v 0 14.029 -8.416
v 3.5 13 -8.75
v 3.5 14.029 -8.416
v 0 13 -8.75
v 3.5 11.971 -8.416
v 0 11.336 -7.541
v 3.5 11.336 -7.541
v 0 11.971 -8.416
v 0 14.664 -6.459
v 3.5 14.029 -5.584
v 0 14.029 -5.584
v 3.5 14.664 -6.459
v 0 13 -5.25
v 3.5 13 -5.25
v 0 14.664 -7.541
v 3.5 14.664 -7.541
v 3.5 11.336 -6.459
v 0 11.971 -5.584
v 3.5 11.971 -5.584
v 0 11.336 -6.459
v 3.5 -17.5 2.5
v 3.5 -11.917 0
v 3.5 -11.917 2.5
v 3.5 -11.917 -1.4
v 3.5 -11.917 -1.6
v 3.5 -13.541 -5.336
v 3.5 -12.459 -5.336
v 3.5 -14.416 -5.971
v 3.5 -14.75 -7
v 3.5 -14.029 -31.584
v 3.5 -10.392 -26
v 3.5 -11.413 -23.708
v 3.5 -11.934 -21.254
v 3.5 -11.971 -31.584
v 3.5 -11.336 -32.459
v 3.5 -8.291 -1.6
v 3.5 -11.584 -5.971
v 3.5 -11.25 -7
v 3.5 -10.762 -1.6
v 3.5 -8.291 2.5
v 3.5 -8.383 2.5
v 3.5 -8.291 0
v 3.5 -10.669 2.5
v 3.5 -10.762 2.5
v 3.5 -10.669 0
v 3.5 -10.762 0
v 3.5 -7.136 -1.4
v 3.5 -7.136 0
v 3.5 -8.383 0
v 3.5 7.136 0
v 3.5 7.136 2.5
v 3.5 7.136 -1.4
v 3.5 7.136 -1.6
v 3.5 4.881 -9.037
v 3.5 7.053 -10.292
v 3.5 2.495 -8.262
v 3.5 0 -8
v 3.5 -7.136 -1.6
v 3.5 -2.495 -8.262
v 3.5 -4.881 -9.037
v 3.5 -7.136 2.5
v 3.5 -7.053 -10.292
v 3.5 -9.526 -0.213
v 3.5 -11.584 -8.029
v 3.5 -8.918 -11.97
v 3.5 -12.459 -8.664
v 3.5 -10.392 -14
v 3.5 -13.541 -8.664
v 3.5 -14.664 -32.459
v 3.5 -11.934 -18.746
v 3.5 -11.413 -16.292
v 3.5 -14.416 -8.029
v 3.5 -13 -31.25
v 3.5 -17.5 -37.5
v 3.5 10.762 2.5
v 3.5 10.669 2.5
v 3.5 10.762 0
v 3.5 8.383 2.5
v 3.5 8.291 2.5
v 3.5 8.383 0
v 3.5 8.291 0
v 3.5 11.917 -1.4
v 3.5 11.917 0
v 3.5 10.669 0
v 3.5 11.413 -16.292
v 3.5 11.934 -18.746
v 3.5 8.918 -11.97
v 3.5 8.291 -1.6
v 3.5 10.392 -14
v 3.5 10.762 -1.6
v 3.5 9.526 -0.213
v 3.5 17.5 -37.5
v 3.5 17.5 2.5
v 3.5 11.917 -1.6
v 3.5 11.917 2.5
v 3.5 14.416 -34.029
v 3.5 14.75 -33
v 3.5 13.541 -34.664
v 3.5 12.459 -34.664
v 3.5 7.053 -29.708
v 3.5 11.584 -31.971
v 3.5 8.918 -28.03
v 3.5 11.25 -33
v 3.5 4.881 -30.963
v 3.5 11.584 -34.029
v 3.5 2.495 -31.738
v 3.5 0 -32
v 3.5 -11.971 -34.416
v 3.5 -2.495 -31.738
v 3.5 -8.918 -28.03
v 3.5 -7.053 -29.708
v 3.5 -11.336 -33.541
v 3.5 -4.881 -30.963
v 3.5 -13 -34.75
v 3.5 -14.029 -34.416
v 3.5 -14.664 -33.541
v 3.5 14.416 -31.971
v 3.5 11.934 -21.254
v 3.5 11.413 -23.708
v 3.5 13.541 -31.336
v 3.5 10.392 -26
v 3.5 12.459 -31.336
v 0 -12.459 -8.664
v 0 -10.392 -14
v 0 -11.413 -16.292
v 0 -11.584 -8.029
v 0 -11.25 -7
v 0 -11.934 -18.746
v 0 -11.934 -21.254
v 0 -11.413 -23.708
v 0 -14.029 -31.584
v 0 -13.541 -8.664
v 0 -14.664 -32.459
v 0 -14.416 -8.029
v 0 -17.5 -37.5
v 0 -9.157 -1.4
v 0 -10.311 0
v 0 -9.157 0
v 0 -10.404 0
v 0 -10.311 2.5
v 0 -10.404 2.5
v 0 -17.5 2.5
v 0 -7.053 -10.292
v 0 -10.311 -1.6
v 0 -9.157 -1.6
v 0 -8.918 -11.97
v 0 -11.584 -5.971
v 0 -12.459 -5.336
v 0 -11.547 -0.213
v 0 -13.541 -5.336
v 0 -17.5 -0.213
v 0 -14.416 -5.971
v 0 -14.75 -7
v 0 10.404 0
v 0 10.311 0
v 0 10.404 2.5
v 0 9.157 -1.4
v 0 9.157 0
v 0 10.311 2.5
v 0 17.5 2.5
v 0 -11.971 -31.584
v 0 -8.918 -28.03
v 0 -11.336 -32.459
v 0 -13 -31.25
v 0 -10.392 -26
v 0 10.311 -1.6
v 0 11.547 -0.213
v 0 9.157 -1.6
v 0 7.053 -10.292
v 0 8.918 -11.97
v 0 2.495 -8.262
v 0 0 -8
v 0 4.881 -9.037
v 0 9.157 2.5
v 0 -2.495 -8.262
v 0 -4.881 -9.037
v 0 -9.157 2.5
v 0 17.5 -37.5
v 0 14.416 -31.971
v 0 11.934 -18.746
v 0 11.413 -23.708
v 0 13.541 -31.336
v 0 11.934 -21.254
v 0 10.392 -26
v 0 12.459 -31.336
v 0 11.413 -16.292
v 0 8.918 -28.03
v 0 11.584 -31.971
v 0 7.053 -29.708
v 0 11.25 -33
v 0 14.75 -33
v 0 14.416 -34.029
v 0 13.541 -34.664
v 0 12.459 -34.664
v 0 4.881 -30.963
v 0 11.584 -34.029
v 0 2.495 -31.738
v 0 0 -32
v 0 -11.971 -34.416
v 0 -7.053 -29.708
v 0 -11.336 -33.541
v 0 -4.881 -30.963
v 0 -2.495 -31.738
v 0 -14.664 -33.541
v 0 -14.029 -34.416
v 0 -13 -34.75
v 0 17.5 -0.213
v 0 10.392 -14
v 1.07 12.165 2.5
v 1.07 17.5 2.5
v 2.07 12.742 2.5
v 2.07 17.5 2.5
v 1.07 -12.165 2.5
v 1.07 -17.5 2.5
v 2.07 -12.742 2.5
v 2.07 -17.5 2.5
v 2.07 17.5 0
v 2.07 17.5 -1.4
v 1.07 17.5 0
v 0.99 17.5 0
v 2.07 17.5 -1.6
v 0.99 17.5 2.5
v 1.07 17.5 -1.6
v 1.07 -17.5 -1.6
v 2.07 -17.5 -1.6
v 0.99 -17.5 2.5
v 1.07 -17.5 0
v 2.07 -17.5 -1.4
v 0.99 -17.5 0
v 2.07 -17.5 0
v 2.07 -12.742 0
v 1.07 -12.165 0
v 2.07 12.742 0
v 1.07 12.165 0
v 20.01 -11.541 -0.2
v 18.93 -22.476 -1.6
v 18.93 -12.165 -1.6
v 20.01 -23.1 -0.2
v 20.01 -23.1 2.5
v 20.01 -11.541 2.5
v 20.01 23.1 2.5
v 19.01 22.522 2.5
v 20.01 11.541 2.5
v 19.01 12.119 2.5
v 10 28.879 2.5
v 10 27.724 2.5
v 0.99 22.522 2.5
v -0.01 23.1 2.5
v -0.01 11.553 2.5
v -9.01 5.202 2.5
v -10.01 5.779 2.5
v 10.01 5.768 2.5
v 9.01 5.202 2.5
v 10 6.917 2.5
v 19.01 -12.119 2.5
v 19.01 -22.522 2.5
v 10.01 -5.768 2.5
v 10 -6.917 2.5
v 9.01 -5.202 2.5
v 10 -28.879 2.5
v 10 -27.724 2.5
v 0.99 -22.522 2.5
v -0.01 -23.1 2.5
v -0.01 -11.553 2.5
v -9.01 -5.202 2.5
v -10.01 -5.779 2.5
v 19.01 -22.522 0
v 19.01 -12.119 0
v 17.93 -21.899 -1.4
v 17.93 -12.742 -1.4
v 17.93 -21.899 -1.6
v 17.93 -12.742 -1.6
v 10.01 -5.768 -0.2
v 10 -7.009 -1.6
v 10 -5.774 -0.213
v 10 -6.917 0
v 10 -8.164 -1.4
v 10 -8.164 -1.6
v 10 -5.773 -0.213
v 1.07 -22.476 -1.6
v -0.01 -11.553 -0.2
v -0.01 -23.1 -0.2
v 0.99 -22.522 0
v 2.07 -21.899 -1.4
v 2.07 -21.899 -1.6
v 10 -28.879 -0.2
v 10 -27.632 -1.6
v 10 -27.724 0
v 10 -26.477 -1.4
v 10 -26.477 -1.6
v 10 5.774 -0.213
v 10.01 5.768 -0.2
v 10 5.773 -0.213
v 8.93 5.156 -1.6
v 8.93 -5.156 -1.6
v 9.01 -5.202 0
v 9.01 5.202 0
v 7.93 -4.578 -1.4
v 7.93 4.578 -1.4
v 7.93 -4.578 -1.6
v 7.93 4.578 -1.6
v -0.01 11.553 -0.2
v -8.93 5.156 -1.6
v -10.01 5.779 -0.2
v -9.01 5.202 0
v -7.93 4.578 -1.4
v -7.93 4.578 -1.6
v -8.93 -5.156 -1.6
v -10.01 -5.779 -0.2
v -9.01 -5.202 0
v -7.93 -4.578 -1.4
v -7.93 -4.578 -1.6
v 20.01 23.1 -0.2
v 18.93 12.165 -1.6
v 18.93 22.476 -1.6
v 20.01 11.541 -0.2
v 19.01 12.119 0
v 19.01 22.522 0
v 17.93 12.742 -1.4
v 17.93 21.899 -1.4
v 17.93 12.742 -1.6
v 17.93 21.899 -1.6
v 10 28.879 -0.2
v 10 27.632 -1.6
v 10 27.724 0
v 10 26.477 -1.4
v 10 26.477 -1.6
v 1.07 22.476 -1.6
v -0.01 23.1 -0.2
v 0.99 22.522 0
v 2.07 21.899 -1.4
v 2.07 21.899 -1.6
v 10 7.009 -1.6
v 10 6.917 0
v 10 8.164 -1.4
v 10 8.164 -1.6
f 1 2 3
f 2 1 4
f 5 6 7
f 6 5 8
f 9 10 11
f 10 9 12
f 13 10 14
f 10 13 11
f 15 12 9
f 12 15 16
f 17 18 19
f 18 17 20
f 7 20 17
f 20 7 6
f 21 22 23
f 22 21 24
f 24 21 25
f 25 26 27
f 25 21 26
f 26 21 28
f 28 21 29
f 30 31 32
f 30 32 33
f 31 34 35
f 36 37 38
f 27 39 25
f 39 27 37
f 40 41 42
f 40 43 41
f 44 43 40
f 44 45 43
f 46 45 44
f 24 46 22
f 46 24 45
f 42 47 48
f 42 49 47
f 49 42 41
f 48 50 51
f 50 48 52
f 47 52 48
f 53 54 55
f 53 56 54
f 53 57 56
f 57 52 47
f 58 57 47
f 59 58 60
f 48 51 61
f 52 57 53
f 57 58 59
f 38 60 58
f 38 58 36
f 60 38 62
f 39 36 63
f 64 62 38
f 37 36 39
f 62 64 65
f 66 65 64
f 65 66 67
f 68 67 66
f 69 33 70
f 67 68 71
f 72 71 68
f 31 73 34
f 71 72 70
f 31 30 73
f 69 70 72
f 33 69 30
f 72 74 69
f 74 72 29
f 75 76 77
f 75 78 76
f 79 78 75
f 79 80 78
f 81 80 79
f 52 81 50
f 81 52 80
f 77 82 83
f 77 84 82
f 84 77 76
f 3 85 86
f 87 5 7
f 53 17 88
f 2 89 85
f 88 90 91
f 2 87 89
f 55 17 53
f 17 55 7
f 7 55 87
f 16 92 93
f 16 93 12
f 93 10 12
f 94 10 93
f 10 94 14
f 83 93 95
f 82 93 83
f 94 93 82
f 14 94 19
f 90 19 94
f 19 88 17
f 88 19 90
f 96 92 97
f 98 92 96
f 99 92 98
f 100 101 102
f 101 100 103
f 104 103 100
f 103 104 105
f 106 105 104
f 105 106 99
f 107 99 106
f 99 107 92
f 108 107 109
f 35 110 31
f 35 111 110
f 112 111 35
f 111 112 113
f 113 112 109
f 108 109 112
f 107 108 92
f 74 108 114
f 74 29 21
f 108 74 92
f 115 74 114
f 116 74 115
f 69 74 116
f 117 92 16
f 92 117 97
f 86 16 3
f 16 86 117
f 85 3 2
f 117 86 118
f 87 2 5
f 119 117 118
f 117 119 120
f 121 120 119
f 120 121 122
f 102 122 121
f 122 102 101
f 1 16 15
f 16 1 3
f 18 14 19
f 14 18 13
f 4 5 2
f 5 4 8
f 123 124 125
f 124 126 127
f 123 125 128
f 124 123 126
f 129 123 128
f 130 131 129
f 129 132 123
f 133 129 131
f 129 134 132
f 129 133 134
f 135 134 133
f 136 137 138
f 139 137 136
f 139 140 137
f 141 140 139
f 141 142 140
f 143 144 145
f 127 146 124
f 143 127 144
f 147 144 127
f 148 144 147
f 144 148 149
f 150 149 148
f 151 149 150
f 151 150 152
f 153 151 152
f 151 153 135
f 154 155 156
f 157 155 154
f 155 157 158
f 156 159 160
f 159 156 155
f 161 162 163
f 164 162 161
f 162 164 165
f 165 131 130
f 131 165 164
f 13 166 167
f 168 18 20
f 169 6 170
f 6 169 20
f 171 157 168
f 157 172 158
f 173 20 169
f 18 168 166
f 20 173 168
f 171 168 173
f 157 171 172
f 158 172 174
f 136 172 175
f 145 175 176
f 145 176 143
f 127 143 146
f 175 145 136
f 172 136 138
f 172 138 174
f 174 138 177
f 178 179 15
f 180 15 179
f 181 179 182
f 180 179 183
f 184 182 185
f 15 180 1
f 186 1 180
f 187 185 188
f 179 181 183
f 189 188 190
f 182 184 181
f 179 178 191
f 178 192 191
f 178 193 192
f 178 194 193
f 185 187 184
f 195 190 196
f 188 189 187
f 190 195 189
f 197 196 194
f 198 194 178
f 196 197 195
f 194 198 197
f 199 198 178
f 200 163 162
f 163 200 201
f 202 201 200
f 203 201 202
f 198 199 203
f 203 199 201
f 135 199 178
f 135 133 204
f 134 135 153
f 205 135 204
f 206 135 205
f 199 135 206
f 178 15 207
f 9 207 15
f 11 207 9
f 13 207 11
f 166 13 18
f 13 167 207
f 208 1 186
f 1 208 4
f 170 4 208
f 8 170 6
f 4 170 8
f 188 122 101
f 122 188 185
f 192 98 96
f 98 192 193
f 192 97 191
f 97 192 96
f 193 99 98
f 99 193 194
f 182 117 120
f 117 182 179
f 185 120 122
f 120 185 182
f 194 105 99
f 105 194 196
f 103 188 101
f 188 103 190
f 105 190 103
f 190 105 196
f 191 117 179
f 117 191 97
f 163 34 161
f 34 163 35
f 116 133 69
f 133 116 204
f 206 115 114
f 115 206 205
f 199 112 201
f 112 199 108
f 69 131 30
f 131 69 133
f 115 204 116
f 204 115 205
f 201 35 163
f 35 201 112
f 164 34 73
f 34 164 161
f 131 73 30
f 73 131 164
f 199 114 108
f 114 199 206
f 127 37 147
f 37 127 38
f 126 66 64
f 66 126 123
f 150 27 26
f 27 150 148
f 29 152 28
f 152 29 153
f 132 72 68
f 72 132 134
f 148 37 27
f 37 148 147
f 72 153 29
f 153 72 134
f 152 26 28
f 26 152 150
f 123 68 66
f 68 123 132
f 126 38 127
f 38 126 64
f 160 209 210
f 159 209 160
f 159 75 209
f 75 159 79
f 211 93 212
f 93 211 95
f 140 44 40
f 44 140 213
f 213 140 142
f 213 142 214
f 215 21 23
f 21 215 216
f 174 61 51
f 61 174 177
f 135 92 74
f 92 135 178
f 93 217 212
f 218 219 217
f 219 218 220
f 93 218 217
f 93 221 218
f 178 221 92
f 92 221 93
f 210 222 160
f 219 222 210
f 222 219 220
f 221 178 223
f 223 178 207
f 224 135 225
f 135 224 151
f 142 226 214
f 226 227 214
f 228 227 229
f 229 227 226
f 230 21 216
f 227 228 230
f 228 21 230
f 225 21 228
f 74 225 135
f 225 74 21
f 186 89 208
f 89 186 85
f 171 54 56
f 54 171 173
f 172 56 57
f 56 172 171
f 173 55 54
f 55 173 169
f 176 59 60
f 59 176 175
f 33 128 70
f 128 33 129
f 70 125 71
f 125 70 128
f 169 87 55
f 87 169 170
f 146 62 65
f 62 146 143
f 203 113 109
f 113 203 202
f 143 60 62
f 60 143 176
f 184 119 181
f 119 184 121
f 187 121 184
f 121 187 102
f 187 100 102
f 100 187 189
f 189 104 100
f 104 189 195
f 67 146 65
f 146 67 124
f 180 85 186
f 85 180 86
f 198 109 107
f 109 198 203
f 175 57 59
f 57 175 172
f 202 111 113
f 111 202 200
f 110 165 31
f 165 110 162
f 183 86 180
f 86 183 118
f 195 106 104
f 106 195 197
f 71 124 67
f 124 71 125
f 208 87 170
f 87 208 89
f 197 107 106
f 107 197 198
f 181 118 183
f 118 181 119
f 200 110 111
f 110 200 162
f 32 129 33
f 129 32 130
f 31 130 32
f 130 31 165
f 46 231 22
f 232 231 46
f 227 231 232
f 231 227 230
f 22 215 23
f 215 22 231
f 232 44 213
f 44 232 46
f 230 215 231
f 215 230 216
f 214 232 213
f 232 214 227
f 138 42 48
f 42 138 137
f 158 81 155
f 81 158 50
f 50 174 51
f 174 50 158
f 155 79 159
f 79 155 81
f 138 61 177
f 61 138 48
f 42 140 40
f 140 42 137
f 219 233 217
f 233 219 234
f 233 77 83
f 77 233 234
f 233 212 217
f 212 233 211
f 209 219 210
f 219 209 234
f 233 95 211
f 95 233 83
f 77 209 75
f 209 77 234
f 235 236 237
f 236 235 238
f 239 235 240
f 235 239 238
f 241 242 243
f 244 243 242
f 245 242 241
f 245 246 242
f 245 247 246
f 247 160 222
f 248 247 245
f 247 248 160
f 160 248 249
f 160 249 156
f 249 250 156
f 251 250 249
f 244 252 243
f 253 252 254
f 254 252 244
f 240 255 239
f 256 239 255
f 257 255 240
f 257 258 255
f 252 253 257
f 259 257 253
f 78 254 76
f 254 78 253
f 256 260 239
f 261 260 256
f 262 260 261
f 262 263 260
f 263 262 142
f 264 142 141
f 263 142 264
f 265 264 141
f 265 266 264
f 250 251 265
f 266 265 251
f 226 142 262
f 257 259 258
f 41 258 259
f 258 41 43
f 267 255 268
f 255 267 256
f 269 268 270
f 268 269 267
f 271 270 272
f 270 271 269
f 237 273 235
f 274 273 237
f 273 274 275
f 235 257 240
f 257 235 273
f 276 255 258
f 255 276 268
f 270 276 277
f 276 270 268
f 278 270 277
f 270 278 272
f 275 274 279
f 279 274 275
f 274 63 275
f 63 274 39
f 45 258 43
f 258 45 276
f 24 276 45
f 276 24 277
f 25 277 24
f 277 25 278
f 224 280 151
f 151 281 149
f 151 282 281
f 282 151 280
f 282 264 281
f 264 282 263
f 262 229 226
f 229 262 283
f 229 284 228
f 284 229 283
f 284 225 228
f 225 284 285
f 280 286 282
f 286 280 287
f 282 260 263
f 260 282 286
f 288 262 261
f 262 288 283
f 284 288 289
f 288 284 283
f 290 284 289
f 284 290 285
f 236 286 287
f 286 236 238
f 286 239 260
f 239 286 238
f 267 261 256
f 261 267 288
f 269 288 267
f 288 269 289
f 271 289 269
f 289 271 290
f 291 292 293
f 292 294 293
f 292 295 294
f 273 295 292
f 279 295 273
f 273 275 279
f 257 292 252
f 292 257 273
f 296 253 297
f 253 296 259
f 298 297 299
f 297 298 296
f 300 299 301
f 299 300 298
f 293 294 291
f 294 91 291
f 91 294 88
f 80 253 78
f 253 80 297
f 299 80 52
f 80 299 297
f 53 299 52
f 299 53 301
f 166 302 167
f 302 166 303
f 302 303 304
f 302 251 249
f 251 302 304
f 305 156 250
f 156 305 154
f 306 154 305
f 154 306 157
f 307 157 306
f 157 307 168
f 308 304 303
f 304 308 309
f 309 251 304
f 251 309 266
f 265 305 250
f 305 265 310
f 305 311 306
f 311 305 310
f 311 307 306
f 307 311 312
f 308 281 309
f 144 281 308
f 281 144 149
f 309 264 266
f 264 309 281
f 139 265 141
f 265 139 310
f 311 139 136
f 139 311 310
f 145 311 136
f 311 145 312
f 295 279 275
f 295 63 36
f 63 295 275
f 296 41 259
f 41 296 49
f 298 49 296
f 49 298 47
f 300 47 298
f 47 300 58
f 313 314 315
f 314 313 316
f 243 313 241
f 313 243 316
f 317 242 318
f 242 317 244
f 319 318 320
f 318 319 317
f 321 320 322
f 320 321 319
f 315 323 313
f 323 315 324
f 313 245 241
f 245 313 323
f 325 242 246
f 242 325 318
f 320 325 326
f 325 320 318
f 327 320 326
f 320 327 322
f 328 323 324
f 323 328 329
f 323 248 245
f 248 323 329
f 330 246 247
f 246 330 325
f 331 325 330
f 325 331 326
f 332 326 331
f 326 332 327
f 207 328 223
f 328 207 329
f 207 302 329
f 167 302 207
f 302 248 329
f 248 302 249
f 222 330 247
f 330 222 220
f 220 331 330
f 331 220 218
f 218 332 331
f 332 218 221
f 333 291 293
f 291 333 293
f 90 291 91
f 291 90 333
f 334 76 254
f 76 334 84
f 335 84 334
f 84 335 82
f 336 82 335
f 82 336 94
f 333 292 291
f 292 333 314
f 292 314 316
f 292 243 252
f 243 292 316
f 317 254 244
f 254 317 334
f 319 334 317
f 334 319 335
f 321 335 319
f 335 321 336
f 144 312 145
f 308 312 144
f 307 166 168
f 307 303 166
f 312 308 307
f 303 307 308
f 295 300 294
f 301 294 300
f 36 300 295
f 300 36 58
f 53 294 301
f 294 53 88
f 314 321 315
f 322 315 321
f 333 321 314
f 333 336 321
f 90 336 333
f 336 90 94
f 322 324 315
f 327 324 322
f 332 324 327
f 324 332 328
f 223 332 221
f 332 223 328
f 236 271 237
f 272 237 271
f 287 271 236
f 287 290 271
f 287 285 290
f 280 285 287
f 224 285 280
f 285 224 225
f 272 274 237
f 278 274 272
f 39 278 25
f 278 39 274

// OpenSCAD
// file: Transforms.scad
module shine(angle=10, length=10, height=10, center=true) {
    if($children != 0) {
        intersection() {
            linear_extrude(height) {
                if(center) {
                    polygon([[0,0] , [length*cos(angle/2),length*sin(angle/2)] , [length,0] , [length*cos(-angle/2),length*sin(-angle/2)]]);
                }
                else {
                    polygon([[0,0] , [length*cos(angle),length*sin(angle)] ,  [length*cos(angle/2),length*sin(angle/2)] , [length,0]]);
                }
            } 
            children(); 
        }
    }   
    else {
        linear_extrude(height) {
            if(center) {
                polygon([[0,0] , [length*cos(angle/2),length*sin(angle/2)] , [length,0] , [length*cos(-angle/2),length*sin(-angle/2)]]);
            }
            else {
                polygon([[0,0] , [length*cos(angle),length*sin(angle)] ,  [length*cos(angle/2),length*sin(angle/2)] , [length,0]]);
            }
        }
    }  
}  

    
module cut(size=[10,10,10],translation=[0,0,0]) {
    intersection() {
        children();
        translate(translation) cube(size);
    }
}
// file: HexGrid.scad
use <Transforms.scad>

beamSize = 1;			//Thickness of the beam
beamHeight = 2.5;			//The height of either one of the upper or lower beams.
beamOuterShift = 1.4;		//How far should the outer edge point of the transition from either lower or upper section to middle section be shifted inwards?
beamShift = 1.6;			//How far should the two sections be spread apart?

beamPlay = 0.08; 			//How much room should be left between 


module beam() {
	translate([- (beamSize*2 + beamPlay),0]) 
	polygon([ 	[0,0],
				[beamSize,0],
				[beamSize, beamHeight],
				[beamSize*2 + beamPlay, beamOuterShift + beamHeight],
				[beamSize*2 + beamPlay, beamHeight*2 + beamShift],
				[beamSize   + beamPlay, beamHeight*2 + beamShift],
				[beamSize   + beamPlay, beamHeight + beamShift],
				[0, beamHeight + beamShift - beamOuterShift] ]);
}


module alignedBeam() {
shine(length=20,height=10,angle=60)
translate([10.01,7,0]) rotate([90,0,0]) linear_extrude(height = 15,convexity=3) {
	beam();
}
}

module hexPad() 
render(4) for(i=[0:5]) {
	rotate([0,0,i*60]) alignedBeam();
}

module hexStrip(l = 3) {
	for(i=[0:l-1]) {
		translate([20*i,0,0]) hexPad();
	}
}

module hexGrid(x, y, leftEdge= true, rightEdge= true) {
	for(i=[0:y-1]) {
		translate([0, sin(60) * 20 * i]) {
			if(i%2 == 0) {
				hexStrip(x);
			}
			else {
				if(leftEdge && rightEdge) {
					translate([-10, 0, 0]) hexStrip(x +1);
				}
				else if(leftEdge) {
					translate([-10, 0, 0]) hexStrip(x);
				}
				else if(rightEdge) {
					translate([10, 0, 0]) hexStrip(x);
				}
				else {
					translate([10, 0, 0]) hexStrip(x -1);
				}
			}
		}
	}
}

hexGrid(1,1, false, false);
// main file
use <HexGrid.scad>


plateThickness = 3.5;

difference() {
	translate([plateThickness,0, -35/2 - 2.5]) rotate([0, -90, 0]) difference() {
		translate([-35/2, -35/2, 0]) cube([40,35,plateThickness]);
		cylinder(d=24,h=plateThickness);
		for(i=[0:3]) rotate([0,0, 90*i]) translate([26/2, 26/2, 0]) cylinder(d=3.5, h=plateThickness, $fn=10);
	}
	
	translate([10, -sin(60)*20, 0]) difference() {
		hexGrid(1,3, true, false);
	}
}

translate([10, -sin(60)*20, 0]) difference() {
	translate([0,0, -2.5 - 1.6 ]) hexGrid(1,3, true, false);
	translate([-50, -50, -6.6]) cube([100, 100, 5]);
}
